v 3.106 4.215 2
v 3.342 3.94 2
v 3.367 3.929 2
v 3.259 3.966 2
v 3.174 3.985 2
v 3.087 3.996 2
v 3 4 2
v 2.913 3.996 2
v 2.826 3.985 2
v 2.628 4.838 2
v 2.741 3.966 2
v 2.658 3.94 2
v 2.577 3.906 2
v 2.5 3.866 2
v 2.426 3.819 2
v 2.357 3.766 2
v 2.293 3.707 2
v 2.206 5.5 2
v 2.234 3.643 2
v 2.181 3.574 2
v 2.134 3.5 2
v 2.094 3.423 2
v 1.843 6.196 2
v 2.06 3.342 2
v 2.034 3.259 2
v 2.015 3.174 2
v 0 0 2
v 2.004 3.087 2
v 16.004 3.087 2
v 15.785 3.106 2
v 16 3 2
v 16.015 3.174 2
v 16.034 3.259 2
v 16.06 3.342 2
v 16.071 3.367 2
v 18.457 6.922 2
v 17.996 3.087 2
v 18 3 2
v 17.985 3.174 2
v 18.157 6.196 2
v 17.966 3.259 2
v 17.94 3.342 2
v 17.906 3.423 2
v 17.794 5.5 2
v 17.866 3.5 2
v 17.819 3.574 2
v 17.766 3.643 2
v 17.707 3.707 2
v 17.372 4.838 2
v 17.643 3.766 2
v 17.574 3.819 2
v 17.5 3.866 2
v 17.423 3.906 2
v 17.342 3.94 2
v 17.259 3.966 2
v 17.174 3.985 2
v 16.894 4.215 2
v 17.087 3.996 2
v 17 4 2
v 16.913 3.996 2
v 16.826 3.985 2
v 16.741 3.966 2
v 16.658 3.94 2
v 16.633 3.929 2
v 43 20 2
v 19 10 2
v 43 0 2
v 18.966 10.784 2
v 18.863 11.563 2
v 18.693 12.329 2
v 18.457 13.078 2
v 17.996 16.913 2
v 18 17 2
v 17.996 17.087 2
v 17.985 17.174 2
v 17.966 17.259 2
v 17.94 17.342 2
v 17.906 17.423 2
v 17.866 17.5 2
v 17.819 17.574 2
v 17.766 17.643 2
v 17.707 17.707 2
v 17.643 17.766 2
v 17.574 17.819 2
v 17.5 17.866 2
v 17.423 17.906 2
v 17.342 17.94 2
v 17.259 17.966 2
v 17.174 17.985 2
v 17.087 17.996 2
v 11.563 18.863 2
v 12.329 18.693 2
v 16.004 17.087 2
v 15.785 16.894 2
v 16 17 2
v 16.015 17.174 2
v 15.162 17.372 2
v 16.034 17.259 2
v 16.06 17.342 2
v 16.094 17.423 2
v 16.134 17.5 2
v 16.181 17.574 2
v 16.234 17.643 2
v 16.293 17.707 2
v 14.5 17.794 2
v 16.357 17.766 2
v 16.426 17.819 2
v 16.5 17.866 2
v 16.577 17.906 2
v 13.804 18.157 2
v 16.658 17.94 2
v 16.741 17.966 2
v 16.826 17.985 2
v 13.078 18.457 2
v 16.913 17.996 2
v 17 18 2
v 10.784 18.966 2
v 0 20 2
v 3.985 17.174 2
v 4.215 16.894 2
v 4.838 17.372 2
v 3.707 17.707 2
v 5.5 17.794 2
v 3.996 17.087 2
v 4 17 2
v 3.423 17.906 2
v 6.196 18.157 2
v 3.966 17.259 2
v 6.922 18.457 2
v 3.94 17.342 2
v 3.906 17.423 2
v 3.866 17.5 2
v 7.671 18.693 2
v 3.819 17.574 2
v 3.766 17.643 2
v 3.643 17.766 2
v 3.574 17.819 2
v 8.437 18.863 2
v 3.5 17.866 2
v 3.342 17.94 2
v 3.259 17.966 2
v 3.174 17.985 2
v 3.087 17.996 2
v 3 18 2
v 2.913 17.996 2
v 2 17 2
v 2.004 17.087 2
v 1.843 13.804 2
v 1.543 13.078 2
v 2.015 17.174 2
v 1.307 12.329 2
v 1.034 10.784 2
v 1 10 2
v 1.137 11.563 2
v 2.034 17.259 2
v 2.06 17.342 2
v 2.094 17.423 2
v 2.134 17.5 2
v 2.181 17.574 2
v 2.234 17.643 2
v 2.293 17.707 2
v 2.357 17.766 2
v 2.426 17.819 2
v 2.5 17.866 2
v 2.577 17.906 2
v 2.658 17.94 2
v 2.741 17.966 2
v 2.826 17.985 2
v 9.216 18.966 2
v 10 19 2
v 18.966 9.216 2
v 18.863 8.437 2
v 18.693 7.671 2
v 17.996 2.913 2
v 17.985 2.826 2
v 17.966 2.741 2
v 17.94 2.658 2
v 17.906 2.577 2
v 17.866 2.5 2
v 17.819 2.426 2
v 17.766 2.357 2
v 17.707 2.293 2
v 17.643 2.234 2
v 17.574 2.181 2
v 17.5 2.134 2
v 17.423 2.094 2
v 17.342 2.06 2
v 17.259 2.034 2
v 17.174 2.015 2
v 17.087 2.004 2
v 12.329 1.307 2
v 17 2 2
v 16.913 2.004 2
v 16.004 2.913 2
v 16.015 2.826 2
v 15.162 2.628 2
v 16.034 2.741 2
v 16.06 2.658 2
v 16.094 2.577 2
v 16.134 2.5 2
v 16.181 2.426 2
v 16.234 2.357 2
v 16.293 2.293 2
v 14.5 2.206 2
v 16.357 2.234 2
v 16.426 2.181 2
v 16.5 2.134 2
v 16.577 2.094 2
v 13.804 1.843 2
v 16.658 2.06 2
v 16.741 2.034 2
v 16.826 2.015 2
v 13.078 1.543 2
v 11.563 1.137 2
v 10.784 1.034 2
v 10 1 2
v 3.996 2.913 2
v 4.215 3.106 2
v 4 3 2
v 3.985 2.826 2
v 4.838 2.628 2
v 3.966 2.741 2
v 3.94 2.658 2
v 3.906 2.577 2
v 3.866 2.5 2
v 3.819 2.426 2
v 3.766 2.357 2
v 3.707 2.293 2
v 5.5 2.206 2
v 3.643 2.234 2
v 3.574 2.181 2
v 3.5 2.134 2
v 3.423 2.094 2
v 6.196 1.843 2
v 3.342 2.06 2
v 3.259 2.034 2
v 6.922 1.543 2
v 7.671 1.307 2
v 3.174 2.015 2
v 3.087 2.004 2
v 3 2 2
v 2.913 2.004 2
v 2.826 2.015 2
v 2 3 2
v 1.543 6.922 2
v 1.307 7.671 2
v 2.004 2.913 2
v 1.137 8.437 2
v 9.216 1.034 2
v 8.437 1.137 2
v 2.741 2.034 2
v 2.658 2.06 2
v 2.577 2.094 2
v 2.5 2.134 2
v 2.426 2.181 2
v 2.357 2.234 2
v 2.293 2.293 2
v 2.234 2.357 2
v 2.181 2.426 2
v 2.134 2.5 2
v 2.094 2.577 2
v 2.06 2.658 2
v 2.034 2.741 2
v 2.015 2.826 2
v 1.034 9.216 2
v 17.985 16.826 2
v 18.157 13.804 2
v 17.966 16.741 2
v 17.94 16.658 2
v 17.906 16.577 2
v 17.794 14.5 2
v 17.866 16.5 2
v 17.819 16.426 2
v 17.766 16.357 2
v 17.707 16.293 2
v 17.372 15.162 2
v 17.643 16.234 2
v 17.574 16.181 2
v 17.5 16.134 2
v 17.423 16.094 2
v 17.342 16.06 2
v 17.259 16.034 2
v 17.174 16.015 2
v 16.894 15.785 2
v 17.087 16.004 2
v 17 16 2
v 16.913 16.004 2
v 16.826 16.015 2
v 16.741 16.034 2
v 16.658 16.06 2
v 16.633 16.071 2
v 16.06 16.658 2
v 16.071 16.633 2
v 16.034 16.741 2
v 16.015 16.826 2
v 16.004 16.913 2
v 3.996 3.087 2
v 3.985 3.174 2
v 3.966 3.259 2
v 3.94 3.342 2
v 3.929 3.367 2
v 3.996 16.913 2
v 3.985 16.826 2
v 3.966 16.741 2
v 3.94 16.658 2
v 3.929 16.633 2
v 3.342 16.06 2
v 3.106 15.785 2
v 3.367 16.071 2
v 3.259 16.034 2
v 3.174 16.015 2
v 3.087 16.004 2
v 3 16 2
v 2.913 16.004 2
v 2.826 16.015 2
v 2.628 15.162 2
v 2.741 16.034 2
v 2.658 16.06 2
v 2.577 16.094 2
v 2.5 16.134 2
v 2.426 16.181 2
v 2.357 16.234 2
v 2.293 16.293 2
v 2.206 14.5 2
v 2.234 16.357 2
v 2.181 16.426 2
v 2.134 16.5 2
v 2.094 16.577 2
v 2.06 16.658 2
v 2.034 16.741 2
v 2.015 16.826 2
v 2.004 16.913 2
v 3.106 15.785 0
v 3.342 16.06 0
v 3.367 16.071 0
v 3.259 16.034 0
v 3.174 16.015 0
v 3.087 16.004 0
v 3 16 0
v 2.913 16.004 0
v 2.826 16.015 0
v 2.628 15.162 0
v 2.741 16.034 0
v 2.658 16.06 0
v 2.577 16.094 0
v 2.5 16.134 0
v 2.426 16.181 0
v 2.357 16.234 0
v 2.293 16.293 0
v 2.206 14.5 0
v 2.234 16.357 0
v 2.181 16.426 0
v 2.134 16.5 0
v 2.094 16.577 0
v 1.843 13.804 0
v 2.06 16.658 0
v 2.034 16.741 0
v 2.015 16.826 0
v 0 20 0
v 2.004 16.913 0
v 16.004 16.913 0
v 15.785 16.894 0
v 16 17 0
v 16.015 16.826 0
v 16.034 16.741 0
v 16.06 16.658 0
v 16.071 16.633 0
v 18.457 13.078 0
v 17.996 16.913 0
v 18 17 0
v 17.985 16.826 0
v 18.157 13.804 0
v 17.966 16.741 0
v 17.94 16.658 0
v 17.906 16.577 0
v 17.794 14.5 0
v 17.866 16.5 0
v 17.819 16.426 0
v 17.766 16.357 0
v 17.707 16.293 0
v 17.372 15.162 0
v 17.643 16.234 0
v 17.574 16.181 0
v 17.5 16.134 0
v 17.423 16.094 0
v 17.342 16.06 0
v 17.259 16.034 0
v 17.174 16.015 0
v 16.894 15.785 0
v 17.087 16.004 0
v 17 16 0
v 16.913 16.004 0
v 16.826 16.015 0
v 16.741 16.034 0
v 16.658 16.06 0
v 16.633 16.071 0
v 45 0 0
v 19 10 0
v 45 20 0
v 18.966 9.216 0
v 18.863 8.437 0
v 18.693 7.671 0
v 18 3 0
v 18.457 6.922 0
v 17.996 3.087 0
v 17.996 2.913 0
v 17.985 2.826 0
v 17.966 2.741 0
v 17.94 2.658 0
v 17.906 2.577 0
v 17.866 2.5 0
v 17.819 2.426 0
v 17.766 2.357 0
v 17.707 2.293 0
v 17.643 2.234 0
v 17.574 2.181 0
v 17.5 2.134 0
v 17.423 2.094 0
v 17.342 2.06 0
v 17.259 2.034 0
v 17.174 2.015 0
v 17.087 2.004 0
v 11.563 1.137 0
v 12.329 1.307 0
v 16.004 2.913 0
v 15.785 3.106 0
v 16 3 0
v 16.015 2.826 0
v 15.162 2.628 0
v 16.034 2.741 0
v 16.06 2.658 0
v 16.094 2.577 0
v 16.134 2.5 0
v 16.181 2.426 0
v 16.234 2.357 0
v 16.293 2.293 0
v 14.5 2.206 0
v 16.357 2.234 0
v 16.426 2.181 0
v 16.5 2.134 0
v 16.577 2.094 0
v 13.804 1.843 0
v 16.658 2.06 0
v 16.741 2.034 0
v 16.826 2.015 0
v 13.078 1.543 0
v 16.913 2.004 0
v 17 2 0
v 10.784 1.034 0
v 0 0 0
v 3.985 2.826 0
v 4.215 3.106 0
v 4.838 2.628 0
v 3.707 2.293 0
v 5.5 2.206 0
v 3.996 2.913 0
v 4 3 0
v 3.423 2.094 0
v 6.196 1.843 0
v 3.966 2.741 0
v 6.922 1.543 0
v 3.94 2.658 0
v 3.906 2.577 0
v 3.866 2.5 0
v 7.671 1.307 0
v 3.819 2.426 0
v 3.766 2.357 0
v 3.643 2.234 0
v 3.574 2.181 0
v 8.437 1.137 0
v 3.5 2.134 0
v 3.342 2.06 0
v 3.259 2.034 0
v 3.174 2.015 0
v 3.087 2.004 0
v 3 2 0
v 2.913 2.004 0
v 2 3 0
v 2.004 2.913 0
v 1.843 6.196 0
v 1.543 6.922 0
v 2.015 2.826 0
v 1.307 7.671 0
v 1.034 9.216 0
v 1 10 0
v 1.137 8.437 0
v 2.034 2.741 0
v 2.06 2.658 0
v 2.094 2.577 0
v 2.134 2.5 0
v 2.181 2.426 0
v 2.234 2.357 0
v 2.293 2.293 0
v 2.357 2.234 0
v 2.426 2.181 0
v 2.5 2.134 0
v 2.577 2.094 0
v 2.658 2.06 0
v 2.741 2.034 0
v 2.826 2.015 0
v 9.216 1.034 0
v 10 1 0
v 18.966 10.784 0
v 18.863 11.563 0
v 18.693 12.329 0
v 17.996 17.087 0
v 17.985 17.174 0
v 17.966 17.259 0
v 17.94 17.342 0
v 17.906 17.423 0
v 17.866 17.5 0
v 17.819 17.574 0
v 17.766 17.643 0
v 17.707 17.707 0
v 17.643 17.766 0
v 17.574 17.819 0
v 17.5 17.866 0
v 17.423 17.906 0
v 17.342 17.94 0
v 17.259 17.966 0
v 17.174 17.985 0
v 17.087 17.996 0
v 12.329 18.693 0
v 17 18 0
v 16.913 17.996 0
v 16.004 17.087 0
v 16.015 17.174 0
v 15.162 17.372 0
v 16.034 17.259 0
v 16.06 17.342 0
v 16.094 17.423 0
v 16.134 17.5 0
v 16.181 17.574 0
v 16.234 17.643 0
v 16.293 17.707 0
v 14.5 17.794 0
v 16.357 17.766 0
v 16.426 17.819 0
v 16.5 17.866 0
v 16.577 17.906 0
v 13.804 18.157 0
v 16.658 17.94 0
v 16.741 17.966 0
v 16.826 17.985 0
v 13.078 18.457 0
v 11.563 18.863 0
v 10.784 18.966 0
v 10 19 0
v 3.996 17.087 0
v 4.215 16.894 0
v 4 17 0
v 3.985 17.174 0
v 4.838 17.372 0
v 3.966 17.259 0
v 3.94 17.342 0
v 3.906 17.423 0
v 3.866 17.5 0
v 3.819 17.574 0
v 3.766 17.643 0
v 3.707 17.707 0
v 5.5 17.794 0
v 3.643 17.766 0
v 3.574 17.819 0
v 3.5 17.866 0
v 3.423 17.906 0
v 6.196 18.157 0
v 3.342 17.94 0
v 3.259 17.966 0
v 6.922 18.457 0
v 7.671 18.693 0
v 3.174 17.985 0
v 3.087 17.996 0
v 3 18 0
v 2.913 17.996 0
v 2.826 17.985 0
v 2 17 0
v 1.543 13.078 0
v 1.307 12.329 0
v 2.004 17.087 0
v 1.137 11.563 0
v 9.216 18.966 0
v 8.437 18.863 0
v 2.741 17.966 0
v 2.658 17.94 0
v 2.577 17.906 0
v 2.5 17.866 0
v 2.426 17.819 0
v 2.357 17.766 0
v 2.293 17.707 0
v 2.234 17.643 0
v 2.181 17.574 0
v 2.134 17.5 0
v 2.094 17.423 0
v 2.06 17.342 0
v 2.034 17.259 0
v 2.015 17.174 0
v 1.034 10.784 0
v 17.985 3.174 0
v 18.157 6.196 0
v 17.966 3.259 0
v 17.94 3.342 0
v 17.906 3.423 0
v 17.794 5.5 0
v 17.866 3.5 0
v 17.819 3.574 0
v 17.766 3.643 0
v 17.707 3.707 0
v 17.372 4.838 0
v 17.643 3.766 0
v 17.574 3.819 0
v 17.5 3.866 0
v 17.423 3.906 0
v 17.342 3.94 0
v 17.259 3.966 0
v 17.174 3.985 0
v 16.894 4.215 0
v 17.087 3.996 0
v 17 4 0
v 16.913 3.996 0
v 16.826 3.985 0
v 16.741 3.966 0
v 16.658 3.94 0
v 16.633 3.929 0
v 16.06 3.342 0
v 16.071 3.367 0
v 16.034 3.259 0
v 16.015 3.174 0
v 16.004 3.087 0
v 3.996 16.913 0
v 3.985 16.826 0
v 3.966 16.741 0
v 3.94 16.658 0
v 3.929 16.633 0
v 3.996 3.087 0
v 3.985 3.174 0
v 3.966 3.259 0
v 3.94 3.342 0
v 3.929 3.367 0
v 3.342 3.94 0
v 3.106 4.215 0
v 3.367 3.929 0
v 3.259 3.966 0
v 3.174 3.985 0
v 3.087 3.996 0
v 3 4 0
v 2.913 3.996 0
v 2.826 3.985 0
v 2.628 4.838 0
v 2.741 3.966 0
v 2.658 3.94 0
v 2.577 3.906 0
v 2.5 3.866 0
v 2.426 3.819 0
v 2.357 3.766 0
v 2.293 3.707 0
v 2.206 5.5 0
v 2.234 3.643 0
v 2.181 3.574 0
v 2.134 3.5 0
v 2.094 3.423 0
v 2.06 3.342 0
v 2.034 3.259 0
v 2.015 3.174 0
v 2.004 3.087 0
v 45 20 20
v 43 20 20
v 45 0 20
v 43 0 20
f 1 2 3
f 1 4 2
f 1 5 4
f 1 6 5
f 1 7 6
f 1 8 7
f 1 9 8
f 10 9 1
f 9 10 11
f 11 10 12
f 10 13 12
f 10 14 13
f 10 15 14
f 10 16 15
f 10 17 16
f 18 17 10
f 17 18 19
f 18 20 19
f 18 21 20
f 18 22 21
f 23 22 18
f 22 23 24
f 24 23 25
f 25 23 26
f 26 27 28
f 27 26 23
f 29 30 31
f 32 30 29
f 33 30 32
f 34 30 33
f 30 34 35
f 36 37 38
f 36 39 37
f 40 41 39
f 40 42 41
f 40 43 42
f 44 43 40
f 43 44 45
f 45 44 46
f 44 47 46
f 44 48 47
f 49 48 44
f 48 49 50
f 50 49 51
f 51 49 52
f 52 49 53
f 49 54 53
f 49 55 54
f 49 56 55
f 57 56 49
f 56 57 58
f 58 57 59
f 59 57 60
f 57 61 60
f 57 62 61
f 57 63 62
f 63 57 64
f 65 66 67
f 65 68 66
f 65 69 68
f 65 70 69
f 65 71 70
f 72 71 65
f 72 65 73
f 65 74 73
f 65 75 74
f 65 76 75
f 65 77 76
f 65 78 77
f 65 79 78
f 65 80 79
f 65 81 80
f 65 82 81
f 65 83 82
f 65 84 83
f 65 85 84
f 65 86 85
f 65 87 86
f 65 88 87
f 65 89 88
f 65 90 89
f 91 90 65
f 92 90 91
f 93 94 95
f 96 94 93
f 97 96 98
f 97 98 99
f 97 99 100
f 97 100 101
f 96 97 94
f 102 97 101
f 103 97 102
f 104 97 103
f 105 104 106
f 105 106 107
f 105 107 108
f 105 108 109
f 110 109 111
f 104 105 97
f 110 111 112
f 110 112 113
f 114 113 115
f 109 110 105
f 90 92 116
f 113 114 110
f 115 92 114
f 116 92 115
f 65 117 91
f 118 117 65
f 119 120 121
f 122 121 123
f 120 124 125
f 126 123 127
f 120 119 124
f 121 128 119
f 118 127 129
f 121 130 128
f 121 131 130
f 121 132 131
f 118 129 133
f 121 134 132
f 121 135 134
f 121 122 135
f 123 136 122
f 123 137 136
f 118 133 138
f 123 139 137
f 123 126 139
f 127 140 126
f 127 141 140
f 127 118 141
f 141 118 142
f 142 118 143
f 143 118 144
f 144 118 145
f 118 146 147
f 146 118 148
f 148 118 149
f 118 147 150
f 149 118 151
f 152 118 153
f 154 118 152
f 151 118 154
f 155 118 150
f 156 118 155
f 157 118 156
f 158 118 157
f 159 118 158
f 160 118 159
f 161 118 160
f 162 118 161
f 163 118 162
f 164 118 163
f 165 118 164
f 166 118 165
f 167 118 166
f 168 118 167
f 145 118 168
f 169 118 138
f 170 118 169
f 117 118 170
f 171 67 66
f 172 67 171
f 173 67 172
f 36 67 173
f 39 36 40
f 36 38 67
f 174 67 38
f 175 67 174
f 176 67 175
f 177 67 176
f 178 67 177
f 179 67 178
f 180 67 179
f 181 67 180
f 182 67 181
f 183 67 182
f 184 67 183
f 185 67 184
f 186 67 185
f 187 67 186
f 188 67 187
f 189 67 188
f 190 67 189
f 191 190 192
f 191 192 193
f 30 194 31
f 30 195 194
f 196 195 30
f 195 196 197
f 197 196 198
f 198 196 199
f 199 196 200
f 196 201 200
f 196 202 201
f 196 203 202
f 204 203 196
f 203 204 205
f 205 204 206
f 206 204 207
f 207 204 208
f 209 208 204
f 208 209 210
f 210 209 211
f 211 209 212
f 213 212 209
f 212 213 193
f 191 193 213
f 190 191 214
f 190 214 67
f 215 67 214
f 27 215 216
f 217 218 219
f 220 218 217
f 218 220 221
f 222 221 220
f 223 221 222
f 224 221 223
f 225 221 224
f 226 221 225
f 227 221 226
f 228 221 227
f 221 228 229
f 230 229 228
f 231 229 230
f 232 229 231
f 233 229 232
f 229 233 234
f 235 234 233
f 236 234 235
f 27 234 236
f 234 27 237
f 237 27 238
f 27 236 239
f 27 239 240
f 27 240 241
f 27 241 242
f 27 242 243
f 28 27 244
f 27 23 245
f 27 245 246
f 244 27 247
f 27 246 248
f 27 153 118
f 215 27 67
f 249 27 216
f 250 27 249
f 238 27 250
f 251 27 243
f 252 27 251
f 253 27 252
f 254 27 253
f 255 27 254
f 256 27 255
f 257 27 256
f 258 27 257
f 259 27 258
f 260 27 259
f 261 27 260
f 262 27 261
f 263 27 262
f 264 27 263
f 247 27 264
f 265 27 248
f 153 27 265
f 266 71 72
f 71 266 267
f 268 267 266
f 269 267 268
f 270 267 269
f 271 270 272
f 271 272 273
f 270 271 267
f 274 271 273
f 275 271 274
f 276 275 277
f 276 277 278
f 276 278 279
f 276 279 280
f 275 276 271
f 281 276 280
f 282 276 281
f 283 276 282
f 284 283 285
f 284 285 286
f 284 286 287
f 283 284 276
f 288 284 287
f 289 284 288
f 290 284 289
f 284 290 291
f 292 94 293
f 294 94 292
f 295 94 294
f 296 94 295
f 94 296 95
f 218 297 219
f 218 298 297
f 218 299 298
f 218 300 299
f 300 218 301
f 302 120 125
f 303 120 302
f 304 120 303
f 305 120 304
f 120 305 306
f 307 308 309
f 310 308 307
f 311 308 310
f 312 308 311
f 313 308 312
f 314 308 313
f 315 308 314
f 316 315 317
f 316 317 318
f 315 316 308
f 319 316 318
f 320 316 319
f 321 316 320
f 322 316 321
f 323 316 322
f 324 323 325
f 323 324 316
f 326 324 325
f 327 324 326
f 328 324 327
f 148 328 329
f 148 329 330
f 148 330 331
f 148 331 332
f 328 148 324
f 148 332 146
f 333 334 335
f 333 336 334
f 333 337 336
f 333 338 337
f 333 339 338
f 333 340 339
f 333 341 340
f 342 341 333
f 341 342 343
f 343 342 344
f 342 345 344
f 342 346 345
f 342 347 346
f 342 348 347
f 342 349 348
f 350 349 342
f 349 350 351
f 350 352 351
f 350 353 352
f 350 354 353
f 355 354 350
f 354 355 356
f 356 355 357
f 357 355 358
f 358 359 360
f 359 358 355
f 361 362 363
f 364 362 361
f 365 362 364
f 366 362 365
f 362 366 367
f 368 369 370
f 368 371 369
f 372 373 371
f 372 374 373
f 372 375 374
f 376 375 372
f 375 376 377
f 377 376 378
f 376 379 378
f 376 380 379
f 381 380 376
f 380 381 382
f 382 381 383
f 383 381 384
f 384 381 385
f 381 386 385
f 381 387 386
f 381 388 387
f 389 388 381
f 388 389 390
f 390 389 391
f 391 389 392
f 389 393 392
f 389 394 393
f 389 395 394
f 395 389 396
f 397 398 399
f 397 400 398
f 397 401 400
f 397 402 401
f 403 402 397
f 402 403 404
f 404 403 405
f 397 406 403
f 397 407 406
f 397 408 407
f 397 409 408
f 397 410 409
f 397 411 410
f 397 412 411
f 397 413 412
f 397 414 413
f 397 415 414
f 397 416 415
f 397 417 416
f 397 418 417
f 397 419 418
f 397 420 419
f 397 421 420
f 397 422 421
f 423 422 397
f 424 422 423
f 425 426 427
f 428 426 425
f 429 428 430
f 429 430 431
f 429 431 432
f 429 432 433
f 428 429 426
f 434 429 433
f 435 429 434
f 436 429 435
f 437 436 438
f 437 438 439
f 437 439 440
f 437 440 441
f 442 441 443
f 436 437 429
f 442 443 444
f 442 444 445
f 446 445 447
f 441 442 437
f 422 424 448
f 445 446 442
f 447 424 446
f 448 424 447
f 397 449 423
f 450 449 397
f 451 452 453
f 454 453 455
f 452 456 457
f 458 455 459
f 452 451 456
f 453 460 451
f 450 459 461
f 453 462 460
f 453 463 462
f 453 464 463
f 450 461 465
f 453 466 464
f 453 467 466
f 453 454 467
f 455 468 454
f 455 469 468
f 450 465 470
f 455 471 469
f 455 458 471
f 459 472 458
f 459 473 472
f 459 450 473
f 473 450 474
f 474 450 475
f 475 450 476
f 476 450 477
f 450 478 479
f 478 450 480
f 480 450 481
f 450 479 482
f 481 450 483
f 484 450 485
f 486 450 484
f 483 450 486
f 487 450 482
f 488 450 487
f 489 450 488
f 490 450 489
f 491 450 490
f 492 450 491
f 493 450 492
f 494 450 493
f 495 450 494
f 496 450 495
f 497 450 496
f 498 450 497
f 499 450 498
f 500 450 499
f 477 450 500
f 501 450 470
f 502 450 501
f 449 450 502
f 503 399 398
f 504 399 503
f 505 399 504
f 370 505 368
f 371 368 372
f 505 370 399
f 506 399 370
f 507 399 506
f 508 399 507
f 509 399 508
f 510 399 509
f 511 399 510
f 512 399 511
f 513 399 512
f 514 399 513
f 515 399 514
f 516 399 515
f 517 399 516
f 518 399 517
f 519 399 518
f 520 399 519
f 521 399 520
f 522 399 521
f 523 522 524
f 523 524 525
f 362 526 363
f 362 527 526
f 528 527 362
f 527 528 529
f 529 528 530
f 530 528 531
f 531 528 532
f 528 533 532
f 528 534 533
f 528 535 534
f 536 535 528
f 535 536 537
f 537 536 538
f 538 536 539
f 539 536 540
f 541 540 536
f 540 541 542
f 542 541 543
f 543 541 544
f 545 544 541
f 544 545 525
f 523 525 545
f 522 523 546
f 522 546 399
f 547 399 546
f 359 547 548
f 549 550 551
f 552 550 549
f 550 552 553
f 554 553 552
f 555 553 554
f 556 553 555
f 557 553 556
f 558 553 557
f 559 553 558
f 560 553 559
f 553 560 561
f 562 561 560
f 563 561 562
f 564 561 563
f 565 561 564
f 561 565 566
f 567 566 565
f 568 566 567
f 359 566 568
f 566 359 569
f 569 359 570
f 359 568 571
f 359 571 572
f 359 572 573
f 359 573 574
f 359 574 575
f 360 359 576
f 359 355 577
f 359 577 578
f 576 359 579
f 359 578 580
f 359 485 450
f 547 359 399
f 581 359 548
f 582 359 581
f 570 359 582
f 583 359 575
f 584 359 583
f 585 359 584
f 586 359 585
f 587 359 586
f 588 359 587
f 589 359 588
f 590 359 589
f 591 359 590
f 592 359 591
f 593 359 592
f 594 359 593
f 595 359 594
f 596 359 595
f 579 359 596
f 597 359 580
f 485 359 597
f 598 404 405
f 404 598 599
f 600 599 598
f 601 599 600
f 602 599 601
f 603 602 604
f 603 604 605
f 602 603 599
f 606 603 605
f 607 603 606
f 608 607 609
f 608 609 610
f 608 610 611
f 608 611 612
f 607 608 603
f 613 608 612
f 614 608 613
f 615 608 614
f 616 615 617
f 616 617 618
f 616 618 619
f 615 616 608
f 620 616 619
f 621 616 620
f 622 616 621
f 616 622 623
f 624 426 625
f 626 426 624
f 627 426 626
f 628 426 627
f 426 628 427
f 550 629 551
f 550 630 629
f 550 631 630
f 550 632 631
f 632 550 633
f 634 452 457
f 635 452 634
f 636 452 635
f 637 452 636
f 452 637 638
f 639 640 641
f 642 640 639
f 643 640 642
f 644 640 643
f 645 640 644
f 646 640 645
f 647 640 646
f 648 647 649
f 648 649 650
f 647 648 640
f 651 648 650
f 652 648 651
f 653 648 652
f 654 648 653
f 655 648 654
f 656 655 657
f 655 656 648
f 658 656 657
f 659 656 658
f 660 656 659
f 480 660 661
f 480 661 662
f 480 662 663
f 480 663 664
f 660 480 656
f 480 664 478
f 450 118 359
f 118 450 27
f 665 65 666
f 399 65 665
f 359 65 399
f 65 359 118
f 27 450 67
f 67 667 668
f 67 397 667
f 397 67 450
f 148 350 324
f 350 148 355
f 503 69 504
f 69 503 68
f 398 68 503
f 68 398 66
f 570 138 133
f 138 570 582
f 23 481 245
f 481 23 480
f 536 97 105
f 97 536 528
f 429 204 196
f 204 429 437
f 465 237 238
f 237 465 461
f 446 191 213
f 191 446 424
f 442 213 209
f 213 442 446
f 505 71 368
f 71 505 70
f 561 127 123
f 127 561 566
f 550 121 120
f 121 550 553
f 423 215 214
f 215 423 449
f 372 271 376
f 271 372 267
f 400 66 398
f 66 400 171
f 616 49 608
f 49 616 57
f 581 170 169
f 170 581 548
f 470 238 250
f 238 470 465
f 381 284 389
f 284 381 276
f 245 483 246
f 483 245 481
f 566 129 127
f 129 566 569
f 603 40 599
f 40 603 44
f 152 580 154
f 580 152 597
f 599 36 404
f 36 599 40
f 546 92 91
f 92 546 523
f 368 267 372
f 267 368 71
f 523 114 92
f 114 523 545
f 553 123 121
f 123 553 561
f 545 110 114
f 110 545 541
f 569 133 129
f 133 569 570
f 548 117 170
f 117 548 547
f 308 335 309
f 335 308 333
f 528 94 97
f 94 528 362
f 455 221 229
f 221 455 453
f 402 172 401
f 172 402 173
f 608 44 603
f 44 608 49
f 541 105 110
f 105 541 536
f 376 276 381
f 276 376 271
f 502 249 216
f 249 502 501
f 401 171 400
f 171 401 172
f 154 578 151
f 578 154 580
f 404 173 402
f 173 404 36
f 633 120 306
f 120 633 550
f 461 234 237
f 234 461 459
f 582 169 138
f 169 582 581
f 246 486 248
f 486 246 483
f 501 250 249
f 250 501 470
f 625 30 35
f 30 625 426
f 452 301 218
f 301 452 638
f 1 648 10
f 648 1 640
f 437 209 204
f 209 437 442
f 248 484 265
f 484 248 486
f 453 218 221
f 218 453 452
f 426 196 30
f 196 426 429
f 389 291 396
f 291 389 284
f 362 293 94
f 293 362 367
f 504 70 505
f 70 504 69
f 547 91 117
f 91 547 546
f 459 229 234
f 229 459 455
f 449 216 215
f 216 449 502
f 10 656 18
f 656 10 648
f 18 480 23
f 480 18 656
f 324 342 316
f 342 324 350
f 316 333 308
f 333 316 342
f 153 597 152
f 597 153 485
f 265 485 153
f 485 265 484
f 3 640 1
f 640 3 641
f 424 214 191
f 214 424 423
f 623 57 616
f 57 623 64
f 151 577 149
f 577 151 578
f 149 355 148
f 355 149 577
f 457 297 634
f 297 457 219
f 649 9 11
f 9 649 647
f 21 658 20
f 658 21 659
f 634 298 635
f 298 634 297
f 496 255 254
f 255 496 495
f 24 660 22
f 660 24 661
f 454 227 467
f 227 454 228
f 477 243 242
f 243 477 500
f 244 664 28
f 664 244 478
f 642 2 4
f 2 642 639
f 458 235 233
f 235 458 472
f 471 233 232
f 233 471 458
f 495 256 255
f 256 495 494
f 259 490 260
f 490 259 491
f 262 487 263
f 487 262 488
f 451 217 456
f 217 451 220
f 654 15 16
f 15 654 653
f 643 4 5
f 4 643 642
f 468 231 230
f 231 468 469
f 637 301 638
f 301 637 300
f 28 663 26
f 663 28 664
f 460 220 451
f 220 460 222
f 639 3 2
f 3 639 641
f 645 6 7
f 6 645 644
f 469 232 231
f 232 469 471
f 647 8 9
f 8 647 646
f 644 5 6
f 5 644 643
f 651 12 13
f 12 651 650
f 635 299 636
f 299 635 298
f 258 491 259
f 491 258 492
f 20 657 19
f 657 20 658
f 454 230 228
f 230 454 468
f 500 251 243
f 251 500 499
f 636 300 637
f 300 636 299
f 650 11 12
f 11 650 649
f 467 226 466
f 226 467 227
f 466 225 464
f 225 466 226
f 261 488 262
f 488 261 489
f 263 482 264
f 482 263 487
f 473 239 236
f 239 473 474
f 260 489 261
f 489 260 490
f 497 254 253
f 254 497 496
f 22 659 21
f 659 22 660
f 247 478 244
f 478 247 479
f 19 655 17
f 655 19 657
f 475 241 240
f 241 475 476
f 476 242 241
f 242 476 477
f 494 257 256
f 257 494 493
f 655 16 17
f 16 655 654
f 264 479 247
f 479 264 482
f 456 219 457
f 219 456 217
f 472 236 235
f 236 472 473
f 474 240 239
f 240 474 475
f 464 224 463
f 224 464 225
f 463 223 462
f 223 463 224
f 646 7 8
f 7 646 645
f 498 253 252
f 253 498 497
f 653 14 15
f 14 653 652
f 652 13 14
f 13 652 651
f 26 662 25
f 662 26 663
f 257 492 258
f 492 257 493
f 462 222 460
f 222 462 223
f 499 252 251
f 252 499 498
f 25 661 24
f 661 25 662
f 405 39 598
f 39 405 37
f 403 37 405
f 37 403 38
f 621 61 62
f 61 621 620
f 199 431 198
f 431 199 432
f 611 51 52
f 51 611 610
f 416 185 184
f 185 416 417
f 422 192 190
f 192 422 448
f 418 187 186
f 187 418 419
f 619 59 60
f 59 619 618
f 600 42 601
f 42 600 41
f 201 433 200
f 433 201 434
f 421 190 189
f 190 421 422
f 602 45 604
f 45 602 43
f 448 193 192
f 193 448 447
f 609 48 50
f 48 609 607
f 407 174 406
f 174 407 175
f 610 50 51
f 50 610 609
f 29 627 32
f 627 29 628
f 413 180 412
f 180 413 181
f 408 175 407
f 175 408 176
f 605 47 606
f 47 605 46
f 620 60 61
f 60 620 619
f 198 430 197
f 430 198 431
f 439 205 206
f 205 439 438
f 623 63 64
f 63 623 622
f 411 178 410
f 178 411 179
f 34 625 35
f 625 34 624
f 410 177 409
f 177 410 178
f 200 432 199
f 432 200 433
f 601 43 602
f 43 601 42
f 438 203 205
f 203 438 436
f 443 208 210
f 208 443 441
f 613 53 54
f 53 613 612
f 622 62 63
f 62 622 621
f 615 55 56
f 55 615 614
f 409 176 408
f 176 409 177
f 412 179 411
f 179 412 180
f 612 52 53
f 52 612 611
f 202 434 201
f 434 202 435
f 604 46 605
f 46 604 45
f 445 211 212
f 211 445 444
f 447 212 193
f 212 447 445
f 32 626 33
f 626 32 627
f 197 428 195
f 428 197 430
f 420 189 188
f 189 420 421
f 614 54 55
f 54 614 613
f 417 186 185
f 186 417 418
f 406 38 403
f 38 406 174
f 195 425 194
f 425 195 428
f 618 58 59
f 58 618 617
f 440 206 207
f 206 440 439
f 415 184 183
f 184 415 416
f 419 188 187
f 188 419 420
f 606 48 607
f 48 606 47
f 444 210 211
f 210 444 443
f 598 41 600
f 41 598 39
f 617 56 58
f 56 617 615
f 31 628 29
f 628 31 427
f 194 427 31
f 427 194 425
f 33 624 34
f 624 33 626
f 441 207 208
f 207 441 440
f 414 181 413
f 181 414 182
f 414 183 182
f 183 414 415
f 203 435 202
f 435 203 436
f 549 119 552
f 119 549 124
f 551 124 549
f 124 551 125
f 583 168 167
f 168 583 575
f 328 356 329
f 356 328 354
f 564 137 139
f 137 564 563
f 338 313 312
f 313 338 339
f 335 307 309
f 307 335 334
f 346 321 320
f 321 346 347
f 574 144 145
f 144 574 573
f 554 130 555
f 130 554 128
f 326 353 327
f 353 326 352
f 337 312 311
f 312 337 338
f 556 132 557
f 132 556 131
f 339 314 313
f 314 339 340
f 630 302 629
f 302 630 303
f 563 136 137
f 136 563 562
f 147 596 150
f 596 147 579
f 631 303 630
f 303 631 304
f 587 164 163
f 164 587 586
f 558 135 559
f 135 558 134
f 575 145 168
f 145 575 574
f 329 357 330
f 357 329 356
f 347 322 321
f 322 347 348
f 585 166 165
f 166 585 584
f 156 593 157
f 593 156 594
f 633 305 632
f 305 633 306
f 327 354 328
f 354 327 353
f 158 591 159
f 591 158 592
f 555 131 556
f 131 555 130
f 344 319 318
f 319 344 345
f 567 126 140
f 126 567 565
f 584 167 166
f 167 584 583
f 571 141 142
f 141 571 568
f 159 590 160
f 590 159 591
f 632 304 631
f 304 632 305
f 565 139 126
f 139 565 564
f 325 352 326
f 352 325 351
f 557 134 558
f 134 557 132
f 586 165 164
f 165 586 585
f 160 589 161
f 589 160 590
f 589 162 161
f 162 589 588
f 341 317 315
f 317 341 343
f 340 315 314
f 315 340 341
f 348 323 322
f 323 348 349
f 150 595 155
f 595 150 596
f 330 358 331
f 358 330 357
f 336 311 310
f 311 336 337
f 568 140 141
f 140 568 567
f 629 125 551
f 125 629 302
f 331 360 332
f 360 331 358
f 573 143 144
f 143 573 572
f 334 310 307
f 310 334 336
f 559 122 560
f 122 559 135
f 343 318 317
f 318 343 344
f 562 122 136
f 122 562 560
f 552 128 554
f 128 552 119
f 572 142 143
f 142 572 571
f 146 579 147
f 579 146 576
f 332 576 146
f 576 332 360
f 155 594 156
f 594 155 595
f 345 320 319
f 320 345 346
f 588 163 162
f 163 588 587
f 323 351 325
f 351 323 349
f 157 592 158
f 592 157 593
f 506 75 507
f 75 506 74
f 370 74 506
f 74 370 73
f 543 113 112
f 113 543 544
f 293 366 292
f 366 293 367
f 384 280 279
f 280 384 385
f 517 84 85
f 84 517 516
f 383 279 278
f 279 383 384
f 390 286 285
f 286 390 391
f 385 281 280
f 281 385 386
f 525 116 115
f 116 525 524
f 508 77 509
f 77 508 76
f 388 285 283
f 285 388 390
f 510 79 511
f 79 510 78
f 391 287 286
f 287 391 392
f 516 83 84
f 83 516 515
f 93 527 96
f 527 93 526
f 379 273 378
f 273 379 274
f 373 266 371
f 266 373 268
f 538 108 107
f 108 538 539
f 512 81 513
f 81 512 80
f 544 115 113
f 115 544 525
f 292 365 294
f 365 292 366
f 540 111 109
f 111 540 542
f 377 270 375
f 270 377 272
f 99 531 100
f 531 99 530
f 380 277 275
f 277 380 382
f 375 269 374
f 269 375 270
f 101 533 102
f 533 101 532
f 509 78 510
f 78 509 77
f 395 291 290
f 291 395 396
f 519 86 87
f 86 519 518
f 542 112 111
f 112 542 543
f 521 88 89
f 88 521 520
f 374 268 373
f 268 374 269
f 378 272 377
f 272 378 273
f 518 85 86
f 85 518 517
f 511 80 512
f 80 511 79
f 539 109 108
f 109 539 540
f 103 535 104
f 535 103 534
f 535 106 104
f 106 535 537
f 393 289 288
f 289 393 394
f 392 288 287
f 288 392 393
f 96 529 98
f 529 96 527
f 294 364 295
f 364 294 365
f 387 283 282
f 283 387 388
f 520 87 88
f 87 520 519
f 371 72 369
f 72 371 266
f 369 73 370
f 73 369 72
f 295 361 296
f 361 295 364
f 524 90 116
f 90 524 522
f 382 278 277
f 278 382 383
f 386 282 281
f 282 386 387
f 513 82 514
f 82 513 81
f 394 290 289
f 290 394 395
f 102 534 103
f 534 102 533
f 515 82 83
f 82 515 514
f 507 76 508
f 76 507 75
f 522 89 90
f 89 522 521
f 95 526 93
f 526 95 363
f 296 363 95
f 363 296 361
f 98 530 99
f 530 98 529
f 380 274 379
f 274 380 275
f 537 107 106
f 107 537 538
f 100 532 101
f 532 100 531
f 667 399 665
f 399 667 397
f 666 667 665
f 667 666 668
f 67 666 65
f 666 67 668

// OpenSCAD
$fn=72;

t=2;

fs=20;
fd=18;
sh=2;

sx=25;
sz=20;

difference() {
    cube([fs, fs, t]);
    translate([fs/2, fs/2, 0]) cylinder(t, d=fd);
    translate([3, 3, 0]) cylinder(t, d=sh);
    translate([fs-3, 3, 0]) cylinder(t, d=sh);
    translate([3, fs-3, 0]) cylinder(t, d=sh);
    translate([fs-3, fs-3, 0]) cylinder(t, d=sh);
}

translate([fs, 0, 0]) cube([sx, fs, t]);
translate([fs+sx-t, 0, 0]) cube([2, fs, sz]);
